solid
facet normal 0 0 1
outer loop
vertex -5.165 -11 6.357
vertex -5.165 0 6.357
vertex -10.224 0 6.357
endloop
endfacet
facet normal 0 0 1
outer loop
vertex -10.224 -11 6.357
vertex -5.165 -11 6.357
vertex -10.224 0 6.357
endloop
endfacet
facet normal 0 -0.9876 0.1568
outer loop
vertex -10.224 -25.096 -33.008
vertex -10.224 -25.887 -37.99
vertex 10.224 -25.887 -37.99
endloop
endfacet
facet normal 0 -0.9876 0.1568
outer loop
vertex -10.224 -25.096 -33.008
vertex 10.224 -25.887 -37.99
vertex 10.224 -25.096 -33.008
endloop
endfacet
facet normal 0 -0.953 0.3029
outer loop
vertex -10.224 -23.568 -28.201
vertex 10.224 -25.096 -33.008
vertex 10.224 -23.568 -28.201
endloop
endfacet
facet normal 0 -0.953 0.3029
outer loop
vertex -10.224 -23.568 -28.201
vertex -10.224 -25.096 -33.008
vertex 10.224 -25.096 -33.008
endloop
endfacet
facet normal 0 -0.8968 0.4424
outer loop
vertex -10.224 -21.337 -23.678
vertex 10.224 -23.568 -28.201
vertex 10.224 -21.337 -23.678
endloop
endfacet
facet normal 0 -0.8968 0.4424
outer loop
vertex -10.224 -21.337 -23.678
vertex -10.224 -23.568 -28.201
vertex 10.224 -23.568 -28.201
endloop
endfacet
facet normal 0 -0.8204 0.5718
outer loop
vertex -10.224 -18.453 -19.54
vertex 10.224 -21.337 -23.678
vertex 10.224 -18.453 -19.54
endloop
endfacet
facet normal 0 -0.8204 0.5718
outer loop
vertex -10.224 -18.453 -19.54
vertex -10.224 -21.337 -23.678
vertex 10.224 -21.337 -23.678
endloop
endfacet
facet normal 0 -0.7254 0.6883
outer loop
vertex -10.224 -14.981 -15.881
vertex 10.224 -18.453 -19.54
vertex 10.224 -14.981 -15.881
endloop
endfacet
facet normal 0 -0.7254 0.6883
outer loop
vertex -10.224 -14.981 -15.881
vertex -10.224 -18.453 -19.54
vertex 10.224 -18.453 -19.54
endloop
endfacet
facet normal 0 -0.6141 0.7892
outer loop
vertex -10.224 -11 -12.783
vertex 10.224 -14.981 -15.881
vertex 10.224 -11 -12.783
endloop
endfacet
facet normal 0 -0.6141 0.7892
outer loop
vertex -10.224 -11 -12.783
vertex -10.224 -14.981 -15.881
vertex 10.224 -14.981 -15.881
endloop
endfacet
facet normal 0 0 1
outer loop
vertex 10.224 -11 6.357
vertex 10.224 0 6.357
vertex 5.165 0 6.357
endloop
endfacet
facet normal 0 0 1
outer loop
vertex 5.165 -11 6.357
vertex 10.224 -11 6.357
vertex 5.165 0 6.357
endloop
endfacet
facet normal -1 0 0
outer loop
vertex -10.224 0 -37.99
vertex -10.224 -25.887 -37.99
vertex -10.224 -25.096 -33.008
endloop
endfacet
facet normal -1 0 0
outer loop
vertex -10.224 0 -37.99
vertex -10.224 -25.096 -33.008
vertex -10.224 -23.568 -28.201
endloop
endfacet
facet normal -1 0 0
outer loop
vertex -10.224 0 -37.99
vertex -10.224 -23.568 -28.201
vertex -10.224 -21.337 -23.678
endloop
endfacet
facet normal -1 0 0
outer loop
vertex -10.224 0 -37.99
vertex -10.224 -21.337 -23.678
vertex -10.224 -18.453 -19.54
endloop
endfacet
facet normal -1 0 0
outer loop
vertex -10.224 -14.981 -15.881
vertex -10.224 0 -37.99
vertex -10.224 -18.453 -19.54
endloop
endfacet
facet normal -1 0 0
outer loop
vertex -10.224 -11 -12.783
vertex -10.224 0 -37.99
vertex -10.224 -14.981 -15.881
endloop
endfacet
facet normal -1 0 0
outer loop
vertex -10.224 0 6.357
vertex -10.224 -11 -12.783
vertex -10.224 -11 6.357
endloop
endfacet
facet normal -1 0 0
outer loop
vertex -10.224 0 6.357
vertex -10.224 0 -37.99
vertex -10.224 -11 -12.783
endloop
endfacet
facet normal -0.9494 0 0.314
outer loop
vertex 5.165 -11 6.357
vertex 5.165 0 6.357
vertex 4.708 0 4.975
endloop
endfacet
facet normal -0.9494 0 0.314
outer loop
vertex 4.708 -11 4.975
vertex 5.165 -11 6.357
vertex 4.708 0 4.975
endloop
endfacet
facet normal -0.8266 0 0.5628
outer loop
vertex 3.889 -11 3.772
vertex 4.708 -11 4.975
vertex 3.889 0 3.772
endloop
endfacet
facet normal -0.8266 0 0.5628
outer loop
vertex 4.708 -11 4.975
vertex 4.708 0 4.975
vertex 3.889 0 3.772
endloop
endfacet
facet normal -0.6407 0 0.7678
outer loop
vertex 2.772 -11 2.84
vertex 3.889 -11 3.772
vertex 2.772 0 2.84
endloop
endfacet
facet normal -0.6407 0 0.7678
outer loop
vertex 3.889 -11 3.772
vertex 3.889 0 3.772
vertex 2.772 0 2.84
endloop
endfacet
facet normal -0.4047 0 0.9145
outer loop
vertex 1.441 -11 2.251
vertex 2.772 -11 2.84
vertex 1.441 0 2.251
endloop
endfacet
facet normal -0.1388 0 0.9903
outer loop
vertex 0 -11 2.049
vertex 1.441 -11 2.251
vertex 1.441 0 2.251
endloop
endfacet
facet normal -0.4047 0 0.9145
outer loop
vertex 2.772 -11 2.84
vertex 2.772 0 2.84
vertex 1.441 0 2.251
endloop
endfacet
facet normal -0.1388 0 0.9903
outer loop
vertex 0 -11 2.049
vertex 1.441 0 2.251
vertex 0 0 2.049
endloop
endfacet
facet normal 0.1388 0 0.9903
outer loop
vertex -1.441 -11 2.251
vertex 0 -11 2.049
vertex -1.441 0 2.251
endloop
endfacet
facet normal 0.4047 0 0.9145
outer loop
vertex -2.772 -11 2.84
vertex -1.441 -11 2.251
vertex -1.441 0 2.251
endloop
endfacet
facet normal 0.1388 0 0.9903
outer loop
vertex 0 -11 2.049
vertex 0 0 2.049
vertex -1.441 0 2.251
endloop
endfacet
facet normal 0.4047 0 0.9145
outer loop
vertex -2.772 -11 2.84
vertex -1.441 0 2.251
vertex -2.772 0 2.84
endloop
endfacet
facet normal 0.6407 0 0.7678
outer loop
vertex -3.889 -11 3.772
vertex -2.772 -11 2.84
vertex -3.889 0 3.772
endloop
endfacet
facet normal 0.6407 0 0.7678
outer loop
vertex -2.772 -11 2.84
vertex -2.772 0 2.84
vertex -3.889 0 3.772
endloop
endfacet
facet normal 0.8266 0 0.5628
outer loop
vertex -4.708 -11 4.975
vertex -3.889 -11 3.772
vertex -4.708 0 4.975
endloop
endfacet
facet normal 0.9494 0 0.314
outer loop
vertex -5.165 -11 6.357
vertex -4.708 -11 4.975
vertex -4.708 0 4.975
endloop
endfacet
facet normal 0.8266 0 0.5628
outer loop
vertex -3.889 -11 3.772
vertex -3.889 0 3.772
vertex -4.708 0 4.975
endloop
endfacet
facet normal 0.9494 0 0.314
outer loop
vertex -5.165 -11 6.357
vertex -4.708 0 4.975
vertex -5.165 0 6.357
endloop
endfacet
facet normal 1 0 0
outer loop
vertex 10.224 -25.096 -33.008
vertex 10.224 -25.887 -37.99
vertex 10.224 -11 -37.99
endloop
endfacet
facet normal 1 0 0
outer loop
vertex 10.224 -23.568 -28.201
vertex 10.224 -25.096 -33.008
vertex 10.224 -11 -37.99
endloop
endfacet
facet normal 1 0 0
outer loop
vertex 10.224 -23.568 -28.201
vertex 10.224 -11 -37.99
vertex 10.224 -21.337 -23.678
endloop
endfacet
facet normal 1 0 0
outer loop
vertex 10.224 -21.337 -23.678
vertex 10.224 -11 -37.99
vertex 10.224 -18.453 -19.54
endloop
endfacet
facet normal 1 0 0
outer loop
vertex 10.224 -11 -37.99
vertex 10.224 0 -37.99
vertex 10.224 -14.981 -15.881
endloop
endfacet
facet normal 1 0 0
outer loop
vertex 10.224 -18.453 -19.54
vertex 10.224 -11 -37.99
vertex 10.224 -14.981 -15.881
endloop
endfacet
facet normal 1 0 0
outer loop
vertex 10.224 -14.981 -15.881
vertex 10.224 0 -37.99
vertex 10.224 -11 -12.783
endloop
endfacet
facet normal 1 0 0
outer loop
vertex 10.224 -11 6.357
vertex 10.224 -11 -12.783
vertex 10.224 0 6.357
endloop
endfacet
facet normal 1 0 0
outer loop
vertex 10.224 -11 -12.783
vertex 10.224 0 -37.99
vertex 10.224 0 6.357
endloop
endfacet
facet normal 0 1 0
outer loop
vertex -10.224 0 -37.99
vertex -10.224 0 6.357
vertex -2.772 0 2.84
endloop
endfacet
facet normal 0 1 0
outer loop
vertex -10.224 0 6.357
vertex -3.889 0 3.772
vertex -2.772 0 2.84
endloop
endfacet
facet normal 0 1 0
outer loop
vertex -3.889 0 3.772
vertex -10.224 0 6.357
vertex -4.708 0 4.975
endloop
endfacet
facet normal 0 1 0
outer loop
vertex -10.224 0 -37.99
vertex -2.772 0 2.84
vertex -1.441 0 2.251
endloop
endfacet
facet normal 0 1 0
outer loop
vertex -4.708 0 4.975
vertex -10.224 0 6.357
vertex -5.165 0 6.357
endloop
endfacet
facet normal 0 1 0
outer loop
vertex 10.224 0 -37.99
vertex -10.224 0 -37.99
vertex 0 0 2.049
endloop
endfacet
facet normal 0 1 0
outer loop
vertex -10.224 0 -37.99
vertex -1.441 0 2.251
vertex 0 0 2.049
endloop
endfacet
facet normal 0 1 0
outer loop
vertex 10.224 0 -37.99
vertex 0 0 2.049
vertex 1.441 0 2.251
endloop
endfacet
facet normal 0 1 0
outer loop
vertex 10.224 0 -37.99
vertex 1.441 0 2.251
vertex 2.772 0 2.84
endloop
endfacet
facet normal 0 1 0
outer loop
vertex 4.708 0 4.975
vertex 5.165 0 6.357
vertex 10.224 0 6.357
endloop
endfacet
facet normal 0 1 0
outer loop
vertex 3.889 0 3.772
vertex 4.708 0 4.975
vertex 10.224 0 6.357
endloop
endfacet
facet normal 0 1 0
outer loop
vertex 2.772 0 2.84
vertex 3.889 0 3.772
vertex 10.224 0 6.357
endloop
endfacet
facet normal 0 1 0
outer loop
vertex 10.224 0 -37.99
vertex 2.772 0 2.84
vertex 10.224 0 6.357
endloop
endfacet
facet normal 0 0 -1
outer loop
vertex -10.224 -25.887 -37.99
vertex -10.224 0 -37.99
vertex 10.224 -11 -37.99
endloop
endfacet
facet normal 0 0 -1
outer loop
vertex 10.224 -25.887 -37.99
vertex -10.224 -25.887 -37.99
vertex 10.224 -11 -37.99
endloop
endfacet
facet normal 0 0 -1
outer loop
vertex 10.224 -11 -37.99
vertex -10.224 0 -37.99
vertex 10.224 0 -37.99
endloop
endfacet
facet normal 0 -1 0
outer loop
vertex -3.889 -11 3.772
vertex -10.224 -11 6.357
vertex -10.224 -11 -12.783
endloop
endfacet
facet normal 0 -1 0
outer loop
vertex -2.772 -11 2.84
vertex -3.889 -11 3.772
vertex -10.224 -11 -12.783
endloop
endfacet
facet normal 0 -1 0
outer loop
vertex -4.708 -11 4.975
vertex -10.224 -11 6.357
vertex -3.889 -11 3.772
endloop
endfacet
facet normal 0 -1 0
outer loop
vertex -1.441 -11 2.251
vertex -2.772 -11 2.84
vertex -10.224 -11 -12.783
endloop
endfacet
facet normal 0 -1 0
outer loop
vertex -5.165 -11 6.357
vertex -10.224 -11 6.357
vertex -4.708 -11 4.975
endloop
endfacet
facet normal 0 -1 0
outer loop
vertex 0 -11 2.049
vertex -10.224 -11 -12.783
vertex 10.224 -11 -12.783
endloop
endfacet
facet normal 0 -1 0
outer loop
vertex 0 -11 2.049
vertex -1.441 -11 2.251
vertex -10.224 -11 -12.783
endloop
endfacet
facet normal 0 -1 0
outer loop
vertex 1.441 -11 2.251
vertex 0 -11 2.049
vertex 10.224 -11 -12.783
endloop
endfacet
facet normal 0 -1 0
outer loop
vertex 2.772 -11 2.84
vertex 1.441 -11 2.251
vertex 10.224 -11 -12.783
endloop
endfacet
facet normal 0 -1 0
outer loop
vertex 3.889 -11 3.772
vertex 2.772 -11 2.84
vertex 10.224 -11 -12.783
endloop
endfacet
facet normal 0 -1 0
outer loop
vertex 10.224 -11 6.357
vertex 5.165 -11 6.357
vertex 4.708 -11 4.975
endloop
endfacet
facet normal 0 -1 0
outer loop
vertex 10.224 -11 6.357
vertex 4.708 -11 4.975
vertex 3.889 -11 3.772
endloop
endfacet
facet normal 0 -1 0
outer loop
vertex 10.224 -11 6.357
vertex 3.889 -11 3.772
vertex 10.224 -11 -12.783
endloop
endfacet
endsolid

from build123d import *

# Parameters (mm, degrees)
F1_DEPTH    = 11
F2_W        = 20.4476909052
F2_H        = 25.2064025609
F3_DEPTH    = 15
F4_T1_DEPTH = 160.2446021291


# Not quite as in the source:
# - a fillet or chamfer that OpenCascade refuses, or shapes differently, is made with other operations: its cross-section is extruded or revolved along the edge and cut away or added


with BuildPart() as f1:
    # F0 (on Front) → F1 (new body)
    with BuildSketch(Plane.XZ):
        with BuildLine():
            Line((-10.2238454526, -37.989632494), (10.2238454526, -37.989632494))
            Line((10.2238454526, -37.989632494), (10.2238454526, 6.3570427475))
            Line((10.2238454526, 6.3570427475), (5.1648352034, 6.3570427475))
            ThreePointArc((5.1648352034, 6.3570427475), (0, 2.048837482), (-5.1648352034, 6.3570427475))
            Line((-5.1648352034, 6.3570427475), (-10.2238454526, 6.3570427475))
            Line((-10.2238454526, 6.3570427475), (-10.2238454526, -37.989632494))
        make_face()
    extrude(amount=F1_DEPTH)

    # F2 (on face) → F3 (join)
    with BuildSketch(Plane.XZ.offset(11)):
        with Locations((0, -25.3864312136)):
            Rectangle(F2_W, F2_H)
    extrude(amount=F3_DEPTH)

    # F4: fillet of radius 33.557568517 on 1 edges, made by hand

    # F4_s2 → F4_t1 (cut)
    with BuildSketch(Plane.YZ.offset(-80.1223010645)):
        with BuildLine():
            ThreePointArc((-26, -40.7426121779), (-22.0131710898, -24.8781309737), (-11, -12.7832299331))
            Line((-11, -12.7832299331), (-26, -12.7832299331))
            Line((-26, -12.7832299331), (-26, -40.7426121779))
        make_face()
    extrude(amount=F4_T1_DEPTH, mode=Mode.SUBTRACT)


solid = f1.part
